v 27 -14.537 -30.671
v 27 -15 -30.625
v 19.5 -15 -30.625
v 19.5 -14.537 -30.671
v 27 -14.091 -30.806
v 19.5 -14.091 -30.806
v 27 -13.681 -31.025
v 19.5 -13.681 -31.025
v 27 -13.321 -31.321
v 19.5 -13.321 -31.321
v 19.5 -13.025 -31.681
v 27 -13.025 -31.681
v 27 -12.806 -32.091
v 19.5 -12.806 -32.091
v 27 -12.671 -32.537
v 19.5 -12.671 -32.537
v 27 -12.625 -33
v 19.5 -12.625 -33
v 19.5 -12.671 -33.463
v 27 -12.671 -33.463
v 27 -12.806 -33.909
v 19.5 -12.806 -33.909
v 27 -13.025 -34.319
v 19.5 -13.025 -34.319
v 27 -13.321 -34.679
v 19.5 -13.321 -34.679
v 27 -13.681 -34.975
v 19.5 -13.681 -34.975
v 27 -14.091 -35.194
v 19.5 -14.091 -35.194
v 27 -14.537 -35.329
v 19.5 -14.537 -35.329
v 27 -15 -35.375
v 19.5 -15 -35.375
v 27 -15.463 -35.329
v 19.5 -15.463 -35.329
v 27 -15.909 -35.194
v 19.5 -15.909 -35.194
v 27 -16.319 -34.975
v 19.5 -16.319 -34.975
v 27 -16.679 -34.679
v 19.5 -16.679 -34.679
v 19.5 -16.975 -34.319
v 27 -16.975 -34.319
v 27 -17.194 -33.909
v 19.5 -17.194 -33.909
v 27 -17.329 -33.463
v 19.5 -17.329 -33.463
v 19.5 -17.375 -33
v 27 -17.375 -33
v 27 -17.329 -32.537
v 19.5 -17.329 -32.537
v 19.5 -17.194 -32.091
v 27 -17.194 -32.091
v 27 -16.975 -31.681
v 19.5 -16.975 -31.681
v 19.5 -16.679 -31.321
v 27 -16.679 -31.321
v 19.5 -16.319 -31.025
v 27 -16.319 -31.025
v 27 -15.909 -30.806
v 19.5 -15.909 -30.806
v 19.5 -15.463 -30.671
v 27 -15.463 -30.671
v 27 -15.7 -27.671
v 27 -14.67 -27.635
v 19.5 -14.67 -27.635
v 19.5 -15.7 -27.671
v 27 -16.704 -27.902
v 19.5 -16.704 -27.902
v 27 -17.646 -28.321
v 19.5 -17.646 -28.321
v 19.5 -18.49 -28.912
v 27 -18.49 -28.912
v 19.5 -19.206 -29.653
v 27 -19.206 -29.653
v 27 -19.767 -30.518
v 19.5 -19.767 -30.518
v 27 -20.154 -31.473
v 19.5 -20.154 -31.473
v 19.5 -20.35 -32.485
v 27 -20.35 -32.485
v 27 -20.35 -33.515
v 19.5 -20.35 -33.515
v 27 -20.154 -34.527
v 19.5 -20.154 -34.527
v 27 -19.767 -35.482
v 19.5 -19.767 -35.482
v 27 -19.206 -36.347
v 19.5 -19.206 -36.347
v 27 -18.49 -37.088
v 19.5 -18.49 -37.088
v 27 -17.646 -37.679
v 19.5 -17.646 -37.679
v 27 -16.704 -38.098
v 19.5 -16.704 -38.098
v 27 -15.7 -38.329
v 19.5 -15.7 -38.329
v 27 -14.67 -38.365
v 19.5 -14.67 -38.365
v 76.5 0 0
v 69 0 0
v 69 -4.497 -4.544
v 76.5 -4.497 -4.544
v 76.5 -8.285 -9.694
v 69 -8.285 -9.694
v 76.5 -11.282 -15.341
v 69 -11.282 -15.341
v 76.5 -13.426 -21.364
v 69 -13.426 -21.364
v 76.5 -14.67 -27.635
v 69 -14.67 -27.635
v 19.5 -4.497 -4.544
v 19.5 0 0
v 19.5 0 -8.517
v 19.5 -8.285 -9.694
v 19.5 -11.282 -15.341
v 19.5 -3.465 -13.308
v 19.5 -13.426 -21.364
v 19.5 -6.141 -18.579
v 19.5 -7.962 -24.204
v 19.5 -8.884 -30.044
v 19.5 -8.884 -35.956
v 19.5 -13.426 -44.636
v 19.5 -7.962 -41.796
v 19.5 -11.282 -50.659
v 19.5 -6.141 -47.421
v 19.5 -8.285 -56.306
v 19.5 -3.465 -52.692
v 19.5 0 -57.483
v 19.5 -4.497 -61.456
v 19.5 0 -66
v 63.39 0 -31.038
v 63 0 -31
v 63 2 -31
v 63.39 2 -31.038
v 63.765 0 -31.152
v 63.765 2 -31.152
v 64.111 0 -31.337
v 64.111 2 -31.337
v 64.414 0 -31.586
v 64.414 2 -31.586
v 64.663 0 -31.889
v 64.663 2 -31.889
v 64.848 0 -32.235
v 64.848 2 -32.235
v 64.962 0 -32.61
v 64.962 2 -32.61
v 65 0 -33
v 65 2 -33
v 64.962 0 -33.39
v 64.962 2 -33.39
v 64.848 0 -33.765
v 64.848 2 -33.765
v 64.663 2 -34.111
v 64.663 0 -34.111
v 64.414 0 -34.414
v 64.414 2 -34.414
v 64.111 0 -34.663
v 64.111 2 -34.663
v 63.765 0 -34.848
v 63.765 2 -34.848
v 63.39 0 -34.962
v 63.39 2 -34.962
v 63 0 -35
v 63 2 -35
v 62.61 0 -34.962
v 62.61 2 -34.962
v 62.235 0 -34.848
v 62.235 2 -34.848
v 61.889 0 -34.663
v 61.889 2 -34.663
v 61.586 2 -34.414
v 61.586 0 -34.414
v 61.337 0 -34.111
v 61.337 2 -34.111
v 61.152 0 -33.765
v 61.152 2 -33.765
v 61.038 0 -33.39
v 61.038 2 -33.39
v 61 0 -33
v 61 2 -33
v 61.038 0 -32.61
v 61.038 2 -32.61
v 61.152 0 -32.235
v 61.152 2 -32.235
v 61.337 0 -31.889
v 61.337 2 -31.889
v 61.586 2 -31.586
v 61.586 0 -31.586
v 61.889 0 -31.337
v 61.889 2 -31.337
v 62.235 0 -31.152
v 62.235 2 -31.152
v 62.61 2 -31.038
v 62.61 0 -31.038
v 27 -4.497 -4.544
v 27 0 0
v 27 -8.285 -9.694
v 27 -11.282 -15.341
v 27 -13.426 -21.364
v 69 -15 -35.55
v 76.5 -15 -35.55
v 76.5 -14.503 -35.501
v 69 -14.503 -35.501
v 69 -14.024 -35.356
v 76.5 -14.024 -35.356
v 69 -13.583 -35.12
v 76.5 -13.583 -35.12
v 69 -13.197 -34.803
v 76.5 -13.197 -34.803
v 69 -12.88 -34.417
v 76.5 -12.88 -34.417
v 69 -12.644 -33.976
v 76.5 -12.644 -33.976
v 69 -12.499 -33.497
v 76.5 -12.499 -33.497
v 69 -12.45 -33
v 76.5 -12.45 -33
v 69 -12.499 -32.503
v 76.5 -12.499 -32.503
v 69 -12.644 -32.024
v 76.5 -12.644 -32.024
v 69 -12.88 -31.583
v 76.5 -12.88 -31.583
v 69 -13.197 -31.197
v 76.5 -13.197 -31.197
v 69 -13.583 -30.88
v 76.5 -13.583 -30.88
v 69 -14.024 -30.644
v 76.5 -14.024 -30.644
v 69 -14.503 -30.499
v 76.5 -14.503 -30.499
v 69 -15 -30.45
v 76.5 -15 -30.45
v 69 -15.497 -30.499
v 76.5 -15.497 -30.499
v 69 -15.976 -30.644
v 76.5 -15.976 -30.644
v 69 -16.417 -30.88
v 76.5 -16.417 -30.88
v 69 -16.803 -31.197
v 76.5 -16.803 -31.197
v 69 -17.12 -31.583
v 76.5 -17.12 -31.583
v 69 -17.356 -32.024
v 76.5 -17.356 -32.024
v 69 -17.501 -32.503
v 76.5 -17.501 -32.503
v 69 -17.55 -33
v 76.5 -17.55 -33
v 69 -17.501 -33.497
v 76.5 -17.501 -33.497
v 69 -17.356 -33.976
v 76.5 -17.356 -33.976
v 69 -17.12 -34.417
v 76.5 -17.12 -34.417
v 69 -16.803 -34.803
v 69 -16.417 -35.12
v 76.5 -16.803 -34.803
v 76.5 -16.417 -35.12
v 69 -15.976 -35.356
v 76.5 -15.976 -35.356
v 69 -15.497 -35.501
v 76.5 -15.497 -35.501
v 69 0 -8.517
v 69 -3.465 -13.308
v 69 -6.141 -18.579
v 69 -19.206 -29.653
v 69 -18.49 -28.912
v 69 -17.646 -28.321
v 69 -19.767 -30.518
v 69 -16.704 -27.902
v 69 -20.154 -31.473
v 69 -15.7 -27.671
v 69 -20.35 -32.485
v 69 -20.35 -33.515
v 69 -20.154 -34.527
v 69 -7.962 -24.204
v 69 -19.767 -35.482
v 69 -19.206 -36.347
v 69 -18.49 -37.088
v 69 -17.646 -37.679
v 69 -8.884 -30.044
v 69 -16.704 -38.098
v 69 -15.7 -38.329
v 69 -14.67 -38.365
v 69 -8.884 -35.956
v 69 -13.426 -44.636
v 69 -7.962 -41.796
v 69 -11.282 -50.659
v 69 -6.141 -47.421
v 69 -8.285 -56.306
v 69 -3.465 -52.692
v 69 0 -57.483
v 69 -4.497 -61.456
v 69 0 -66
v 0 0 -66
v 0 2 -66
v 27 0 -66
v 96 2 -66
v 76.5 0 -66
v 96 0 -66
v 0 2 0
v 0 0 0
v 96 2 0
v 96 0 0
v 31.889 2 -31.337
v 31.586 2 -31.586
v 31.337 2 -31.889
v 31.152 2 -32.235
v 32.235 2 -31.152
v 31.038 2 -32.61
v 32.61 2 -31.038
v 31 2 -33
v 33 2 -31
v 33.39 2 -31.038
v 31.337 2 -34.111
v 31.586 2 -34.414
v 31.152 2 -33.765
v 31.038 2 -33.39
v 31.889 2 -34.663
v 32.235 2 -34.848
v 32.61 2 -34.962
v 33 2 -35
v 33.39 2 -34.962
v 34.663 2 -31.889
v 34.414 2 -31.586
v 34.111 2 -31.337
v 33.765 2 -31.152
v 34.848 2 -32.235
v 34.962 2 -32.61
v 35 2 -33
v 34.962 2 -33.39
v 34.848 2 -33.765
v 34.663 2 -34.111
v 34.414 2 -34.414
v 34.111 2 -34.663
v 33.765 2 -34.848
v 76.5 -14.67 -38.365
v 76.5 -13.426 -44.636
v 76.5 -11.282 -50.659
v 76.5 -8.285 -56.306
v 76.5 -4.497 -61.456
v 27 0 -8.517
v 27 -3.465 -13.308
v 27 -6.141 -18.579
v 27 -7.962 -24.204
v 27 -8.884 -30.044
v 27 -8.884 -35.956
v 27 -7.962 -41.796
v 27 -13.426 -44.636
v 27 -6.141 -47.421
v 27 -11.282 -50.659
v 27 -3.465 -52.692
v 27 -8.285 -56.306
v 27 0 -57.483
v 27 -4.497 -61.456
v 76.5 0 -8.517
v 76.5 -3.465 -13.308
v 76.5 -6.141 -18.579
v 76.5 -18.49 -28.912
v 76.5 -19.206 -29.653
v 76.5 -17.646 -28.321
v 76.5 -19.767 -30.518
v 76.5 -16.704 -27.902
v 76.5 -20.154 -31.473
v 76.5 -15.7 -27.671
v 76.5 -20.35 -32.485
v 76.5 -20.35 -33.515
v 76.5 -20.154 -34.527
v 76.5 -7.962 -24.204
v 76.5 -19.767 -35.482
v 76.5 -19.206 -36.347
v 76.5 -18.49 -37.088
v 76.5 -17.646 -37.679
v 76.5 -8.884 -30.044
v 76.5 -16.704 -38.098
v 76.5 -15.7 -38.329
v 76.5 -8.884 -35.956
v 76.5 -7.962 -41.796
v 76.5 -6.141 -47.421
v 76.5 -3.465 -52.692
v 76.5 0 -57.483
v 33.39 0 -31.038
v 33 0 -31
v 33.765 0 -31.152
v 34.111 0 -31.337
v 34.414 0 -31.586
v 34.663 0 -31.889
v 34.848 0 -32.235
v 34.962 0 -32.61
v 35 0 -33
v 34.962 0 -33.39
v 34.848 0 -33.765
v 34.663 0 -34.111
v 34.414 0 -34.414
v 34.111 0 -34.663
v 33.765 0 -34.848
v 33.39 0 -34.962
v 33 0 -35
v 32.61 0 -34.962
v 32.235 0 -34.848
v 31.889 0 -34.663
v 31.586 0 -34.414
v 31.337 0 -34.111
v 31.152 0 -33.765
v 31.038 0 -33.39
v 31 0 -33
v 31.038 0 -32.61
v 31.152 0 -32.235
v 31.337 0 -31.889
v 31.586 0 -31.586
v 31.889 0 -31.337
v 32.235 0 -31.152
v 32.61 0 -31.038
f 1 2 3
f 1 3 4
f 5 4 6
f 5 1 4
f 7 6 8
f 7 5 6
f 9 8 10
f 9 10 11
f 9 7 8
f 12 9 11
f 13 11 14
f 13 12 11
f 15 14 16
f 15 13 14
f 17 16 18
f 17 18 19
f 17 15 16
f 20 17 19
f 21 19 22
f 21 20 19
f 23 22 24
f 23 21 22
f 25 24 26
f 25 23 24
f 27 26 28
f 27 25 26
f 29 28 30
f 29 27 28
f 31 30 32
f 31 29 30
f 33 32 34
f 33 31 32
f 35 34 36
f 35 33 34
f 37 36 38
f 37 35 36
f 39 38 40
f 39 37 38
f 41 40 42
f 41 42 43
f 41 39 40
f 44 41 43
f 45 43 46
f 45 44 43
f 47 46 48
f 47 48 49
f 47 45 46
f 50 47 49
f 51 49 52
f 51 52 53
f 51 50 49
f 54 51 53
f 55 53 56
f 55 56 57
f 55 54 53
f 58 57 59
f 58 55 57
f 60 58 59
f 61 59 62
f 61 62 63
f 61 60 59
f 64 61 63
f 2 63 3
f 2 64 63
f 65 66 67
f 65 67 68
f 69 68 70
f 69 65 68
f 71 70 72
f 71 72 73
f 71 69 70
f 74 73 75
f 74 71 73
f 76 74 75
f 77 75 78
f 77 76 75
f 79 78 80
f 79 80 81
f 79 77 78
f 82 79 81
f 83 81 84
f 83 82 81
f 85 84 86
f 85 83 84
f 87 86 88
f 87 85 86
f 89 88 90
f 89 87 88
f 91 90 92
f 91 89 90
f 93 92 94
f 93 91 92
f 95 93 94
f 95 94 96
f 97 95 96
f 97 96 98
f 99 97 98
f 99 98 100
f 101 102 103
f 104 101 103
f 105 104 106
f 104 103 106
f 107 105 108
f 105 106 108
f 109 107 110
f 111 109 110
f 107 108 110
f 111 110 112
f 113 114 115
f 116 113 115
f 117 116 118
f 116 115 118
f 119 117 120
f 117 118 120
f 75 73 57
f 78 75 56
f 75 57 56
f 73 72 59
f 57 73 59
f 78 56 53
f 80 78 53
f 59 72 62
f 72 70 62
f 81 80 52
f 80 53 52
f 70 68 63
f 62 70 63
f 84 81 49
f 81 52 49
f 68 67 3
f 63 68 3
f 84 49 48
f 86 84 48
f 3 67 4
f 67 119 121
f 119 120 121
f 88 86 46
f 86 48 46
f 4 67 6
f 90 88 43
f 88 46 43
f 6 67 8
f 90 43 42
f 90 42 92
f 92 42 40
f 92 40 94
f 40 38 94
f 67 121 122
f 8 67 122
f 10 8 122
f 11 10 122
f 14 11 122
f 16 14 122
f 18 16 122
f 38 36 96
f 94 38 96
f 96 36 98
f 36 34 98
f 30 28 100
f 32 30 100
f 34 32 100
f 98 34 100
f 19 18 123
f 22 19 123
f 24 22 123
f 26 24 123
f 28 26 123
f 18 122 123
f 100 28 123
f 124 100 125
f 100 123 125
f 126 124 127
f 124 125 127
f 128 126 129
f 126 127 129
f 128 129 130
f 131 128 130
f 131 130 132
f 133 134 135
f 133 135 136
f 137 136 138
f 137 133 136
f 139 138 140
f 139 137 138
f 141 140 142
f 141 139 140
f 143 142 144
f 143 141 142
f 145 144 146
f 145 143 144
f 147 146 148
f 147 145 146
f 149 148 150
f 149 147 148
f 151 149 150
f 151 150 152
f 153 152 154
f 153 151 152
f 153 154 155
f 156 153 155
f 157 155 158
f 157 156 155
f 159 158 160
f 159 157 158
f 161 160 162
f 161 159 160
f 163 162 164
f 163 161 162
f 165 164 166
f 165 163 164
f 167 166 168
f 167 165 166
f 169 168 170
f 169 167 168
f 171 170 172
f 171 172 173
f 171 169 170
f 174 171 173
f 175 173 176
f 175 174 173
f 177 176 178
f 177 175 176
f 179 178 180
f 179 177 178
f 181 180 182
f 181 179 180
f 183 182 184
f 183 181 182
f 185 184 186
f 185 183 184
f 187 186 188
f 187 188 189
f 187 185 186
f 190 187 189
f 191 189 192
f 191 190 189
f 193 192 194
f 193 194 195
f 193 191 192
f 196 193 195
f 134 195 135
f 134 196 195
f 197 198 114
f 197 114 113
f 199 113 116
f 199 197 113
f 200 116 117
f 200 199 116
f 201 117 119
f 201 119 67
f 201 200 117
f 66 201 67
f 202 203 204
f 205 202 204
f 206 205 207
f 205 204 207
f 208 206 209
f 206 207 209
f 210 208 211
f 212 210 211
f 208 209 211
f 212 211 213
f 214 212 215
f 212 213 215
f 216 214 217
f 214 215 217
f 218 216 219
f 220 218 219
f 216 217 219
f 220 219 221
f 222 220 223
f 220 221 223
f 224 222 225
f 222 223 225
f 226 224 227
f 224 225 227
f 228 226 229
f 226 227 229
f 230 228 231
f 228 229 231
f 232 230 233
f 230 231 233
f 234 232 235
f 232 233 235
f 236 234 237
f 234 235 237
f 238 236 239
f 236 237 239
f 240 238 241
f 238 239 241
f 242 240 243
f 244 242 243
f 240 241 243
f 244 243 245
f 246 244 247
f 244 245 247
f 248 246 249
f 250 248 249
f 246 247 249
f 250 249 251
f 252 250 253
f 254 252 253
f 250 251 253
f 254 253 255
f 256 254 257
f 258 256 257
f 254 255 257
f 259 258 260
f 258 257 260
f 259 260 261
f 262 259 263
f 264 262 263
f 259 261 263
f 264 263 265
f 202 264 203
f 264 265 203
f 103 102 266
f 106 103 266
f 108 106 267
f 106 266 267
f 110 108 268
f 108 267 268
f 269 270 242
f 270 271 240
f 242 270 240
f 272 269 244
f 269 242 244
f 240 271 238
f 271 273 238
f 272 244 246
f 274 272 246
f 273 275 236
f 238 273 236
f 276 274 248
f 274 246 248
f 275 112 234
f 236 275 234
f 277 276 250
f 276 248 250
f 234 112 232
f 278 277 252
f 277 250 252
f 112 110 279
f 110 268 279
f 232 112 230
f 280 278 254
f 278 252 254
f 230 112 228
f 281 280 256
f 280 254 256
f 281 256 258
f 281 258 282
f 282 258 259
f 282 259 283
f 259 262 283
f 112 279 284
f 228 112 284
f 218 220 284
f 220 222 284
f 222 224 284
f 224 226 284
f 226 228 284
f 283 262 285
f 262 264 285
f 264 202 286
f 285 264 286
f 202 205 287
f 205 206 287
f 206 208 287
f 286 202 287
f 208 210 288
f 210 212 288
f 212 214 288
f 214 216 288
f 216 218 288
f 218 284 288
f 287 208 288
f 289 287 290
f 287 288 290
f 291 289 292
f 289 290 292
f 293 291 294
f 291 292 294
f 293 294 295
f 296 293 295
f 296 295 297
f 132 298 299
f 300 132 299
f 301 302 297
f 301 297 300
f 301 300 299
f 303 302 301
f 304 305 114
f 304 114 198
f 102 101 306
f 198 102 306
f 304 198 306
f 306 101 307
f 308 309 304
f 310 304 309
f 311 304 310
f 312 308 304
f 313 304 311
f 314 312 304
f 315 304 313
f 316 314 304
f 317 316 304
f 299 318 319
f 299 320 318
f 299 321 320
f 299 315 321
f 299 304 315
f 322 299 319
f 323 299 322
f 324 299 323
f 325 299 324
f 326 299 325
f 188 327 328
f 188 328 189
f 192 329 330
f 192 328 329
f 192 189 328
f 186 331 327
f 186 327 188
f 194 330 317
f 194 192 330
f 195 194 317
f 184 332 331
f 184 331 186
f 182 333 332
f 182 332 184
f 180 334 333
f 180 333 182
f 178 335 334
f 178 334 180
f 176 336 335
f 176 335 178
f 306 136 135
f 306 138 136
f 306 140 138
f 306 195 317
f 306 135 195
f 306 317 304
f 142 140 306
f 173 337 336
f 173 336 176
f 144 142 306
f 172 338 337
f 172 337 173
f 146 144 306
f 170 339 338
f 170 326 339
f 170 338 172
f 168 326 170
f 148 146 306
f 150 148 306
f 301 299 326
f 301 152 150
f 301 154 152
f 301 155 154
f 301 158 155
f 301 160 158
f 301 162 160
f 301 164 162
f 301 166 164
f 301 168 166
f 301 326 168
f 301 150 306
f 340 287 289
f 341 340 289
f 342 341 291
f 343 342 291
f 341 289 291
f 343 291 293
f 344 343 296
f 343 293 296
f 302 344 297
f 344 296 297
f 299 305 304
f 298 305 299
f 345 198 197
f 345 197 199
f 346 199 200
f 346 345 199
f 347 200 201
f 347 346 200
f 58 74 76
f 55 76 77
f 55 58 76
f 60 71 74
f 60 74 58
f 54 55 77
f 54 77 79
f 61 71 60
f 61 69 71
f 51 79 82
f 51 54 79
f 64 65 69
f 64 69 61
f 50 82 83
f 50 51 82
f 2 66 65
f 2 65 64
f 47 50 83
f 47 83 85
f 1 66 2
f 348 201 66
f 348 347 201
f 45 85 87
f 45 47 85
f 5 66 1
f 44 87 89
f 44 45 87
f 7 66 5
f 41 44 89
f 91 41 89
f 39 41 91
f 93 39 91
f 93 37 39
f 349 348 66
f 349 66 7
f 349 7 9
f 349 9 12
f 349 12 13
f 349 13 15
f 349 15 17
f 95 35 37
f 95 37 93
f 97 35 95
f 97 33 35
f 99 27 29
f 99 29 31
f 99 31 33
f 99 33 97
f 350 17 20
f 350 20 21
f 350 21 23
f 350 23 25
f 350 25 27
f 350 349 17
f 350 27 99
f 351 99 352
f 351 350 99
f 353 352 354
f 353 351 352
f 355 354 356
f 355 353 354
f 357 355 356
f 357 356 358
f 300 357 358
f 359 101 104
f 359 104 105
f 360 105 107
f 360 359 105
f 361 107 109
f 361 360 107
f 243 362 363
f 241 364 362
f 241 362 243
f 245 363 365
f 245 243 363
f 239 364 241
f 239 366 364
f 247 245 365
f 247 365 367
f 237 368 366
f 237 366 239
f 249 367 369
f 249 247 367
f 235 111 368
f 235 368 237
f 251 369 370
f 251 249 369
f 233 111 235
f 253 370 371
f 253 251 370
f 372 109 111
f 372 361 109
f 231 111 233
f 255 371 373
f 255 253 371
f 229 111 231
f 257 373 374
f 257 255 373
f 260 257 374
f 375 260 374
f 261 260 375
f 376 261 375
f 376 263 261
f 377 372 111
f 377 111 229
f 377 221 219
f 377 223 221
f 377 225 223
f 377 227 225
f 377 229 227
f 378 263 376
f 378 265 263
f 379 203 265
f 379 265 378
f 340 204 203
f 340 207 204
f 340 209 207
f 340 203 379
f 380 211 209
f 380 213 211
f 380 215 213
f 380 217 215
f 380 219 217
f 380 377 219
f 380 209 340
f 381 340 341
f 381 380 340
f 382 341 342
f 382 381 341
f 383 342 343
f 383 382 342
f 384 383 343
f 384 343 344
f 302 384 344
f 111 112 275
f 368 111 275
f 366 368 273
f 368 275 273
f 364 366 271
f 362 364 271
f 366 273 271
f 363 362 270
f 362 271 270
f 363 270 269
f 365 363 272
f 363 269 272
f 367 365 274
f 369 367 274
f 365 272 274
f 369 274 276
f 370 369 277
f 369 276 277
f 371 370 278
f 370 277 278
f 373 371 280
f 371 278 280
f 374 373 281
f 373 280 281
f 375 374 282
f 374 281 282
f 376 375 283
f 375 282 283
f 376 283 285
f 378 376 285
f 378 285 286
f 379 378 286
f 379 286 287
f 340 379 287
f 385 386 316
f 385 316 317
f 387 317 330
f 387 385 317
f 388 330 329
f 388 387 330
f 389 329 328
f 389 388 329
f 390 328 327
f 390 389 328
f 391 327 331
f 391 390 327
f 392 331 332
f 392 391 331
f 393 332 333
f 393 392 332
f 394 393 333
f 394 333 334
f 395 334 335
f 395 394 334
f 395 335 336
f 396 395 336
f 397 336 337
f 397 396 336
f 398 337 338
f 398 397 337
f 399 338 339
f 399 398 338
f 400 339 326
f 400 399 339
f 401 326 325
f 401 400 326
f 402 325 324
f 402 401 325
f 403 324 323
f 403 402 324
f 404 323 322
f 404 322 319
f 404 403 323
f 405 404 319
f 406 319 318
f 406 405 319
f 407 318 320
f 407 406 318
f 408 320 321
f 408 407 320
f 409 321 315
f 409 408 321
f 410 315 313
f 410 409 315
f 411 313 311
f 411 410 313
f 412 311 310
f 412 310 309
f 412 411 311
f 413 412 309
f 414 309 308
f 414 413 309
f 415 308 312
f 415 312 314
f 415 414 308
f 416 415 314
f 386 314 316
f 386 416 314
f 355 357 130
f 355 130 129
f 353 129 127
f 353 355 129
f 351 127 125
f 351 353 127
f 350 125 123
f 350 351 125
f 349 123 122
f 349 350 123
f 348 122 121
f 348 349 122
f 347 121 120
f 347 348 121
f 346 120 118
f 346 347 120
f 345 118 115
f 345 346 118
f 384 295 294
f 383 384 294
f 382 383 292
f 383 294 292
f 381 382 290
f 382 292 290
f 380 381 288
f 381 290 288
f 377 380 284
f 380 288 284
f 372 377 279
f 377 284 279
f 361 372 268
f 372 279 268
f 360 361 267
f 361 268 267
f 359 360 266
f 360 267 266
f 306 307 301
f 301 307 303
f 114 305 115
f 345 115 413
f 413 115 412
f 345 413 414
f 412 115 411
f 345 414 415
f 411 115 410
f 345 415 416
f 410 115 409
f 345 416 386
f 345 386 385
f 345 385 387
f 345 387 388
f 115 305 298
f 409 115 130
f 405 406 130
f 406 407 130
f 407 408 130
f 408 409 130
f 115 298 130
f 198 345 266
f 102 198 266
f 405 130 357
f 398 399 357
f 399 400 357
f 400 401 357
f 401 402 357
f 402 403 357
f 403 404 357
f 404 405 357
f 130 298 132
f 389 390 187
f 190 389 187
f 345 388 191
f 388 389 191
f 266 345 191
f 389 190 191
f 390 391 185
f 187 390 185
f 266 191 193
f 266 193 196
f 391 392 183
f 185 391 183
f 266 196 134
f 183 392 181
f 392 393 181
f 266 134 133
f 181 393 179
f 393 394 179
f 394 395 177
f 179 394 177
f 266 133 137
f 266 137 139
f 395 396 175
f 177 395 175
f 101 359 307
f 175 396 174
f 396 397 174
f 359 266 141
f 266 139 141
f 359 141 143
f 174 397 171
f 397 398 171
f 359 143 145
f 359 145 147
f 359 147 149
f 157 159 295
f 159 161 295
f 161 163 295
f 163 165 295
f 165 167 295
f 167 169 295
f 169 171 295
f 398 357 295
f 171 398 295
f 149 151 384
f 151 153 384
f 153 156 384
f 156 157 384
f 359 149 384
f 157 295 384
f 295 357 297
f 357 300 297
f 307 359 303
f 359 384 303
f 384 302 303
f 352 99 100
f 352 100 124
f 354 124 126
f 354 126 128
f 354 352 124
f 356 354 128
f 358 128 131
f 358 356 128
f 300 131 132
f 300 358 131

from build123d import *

# Parameters (mm, degrees)
SKETCH1_W           = 96
SKETCH1_H           = 66
SKETCH1_R           = 2
BOSS_EXTRUDE1_DEPTH = 2
SKETCH8_R           = 2.375
BOSS_EXTRUDE3_DEPTH = 7.5
SKETCH9_R           = 2.55
CUT_EXTRUDE1_DEPTH  = 7.5


with BuildPart() as part:
    # Sketch1 → Boss-Extrude1 (new body)
    with BuildSketch(Plane(origin=(0, 0, 0), x_dir=(1, 0, 0), z_dir=(0, 1, 0))):
        with Locations((48, 33)):
            Rectangle(SKETCH1_W, SKETCH1_H)
        with Locations(Location((33, 33, 0), (0, 0, 270))):
            Circle(SKETCH1_R, mode=Mode.SUBTRACT)
        with Locations(Location((63, 33, 0), (0, 0, 270))):
            Circle(SKETCH1_R, mode=Mode.SUBTRACT)
    extrude(amount=BOSS_EXTRUDE1_DEPTH)

    # Sketch8 → Boss-Extrude3 (add)
    with BuildSketch(Plane.ZY.offset(-27)):
        with BuildLine():
            Line((-8.517353084, 0), (0, 0))
            ThreePointArc((0, 0), (-12.462971529, -9.886825426), (-27.6351276, -14.670198345))
            ThreePointArc((-27.6351276, -14.670198345), (-33, -20.375), (-38.3648724, -14.670198345))
            ThreePointArc((-38.3648724, -14.670198345), (-53.537028471, -9.886825426), (-66, 0))
            Line((-66, 0), (-57.482646916, 0))
            ThreePointArc((-57.482646916, 0), (-33, -9), (-8.517353084, 0))
        make_face()
        with Locations((-33, -15)):
            Circle(SKETCH8_R, mode=Mode.SUBTRACT)
    boss_extrude3 = extrude(amount=BOSS_EXTRUDE3_DEPTH)

    # Mirror1: Boss-Extrude3 across plane
    add(boss_extrude3.mirror(Plane.ZY.offset(-48)))

    # Sketch9 → Cut-Extrude1 (cut)
    with BuildSketch(Plane(origin=(76.5, 0, 0), x_dir=(0, 0, -1), z_dir=(1, 0, 0))):
        with Locations((33, -15)):
            Circle(SKETCH9_R)
    extrude(amount=-CUT_EXTRUDE1_DEPTH, mode=Mode.SUBTRACT)


solid = part.part
